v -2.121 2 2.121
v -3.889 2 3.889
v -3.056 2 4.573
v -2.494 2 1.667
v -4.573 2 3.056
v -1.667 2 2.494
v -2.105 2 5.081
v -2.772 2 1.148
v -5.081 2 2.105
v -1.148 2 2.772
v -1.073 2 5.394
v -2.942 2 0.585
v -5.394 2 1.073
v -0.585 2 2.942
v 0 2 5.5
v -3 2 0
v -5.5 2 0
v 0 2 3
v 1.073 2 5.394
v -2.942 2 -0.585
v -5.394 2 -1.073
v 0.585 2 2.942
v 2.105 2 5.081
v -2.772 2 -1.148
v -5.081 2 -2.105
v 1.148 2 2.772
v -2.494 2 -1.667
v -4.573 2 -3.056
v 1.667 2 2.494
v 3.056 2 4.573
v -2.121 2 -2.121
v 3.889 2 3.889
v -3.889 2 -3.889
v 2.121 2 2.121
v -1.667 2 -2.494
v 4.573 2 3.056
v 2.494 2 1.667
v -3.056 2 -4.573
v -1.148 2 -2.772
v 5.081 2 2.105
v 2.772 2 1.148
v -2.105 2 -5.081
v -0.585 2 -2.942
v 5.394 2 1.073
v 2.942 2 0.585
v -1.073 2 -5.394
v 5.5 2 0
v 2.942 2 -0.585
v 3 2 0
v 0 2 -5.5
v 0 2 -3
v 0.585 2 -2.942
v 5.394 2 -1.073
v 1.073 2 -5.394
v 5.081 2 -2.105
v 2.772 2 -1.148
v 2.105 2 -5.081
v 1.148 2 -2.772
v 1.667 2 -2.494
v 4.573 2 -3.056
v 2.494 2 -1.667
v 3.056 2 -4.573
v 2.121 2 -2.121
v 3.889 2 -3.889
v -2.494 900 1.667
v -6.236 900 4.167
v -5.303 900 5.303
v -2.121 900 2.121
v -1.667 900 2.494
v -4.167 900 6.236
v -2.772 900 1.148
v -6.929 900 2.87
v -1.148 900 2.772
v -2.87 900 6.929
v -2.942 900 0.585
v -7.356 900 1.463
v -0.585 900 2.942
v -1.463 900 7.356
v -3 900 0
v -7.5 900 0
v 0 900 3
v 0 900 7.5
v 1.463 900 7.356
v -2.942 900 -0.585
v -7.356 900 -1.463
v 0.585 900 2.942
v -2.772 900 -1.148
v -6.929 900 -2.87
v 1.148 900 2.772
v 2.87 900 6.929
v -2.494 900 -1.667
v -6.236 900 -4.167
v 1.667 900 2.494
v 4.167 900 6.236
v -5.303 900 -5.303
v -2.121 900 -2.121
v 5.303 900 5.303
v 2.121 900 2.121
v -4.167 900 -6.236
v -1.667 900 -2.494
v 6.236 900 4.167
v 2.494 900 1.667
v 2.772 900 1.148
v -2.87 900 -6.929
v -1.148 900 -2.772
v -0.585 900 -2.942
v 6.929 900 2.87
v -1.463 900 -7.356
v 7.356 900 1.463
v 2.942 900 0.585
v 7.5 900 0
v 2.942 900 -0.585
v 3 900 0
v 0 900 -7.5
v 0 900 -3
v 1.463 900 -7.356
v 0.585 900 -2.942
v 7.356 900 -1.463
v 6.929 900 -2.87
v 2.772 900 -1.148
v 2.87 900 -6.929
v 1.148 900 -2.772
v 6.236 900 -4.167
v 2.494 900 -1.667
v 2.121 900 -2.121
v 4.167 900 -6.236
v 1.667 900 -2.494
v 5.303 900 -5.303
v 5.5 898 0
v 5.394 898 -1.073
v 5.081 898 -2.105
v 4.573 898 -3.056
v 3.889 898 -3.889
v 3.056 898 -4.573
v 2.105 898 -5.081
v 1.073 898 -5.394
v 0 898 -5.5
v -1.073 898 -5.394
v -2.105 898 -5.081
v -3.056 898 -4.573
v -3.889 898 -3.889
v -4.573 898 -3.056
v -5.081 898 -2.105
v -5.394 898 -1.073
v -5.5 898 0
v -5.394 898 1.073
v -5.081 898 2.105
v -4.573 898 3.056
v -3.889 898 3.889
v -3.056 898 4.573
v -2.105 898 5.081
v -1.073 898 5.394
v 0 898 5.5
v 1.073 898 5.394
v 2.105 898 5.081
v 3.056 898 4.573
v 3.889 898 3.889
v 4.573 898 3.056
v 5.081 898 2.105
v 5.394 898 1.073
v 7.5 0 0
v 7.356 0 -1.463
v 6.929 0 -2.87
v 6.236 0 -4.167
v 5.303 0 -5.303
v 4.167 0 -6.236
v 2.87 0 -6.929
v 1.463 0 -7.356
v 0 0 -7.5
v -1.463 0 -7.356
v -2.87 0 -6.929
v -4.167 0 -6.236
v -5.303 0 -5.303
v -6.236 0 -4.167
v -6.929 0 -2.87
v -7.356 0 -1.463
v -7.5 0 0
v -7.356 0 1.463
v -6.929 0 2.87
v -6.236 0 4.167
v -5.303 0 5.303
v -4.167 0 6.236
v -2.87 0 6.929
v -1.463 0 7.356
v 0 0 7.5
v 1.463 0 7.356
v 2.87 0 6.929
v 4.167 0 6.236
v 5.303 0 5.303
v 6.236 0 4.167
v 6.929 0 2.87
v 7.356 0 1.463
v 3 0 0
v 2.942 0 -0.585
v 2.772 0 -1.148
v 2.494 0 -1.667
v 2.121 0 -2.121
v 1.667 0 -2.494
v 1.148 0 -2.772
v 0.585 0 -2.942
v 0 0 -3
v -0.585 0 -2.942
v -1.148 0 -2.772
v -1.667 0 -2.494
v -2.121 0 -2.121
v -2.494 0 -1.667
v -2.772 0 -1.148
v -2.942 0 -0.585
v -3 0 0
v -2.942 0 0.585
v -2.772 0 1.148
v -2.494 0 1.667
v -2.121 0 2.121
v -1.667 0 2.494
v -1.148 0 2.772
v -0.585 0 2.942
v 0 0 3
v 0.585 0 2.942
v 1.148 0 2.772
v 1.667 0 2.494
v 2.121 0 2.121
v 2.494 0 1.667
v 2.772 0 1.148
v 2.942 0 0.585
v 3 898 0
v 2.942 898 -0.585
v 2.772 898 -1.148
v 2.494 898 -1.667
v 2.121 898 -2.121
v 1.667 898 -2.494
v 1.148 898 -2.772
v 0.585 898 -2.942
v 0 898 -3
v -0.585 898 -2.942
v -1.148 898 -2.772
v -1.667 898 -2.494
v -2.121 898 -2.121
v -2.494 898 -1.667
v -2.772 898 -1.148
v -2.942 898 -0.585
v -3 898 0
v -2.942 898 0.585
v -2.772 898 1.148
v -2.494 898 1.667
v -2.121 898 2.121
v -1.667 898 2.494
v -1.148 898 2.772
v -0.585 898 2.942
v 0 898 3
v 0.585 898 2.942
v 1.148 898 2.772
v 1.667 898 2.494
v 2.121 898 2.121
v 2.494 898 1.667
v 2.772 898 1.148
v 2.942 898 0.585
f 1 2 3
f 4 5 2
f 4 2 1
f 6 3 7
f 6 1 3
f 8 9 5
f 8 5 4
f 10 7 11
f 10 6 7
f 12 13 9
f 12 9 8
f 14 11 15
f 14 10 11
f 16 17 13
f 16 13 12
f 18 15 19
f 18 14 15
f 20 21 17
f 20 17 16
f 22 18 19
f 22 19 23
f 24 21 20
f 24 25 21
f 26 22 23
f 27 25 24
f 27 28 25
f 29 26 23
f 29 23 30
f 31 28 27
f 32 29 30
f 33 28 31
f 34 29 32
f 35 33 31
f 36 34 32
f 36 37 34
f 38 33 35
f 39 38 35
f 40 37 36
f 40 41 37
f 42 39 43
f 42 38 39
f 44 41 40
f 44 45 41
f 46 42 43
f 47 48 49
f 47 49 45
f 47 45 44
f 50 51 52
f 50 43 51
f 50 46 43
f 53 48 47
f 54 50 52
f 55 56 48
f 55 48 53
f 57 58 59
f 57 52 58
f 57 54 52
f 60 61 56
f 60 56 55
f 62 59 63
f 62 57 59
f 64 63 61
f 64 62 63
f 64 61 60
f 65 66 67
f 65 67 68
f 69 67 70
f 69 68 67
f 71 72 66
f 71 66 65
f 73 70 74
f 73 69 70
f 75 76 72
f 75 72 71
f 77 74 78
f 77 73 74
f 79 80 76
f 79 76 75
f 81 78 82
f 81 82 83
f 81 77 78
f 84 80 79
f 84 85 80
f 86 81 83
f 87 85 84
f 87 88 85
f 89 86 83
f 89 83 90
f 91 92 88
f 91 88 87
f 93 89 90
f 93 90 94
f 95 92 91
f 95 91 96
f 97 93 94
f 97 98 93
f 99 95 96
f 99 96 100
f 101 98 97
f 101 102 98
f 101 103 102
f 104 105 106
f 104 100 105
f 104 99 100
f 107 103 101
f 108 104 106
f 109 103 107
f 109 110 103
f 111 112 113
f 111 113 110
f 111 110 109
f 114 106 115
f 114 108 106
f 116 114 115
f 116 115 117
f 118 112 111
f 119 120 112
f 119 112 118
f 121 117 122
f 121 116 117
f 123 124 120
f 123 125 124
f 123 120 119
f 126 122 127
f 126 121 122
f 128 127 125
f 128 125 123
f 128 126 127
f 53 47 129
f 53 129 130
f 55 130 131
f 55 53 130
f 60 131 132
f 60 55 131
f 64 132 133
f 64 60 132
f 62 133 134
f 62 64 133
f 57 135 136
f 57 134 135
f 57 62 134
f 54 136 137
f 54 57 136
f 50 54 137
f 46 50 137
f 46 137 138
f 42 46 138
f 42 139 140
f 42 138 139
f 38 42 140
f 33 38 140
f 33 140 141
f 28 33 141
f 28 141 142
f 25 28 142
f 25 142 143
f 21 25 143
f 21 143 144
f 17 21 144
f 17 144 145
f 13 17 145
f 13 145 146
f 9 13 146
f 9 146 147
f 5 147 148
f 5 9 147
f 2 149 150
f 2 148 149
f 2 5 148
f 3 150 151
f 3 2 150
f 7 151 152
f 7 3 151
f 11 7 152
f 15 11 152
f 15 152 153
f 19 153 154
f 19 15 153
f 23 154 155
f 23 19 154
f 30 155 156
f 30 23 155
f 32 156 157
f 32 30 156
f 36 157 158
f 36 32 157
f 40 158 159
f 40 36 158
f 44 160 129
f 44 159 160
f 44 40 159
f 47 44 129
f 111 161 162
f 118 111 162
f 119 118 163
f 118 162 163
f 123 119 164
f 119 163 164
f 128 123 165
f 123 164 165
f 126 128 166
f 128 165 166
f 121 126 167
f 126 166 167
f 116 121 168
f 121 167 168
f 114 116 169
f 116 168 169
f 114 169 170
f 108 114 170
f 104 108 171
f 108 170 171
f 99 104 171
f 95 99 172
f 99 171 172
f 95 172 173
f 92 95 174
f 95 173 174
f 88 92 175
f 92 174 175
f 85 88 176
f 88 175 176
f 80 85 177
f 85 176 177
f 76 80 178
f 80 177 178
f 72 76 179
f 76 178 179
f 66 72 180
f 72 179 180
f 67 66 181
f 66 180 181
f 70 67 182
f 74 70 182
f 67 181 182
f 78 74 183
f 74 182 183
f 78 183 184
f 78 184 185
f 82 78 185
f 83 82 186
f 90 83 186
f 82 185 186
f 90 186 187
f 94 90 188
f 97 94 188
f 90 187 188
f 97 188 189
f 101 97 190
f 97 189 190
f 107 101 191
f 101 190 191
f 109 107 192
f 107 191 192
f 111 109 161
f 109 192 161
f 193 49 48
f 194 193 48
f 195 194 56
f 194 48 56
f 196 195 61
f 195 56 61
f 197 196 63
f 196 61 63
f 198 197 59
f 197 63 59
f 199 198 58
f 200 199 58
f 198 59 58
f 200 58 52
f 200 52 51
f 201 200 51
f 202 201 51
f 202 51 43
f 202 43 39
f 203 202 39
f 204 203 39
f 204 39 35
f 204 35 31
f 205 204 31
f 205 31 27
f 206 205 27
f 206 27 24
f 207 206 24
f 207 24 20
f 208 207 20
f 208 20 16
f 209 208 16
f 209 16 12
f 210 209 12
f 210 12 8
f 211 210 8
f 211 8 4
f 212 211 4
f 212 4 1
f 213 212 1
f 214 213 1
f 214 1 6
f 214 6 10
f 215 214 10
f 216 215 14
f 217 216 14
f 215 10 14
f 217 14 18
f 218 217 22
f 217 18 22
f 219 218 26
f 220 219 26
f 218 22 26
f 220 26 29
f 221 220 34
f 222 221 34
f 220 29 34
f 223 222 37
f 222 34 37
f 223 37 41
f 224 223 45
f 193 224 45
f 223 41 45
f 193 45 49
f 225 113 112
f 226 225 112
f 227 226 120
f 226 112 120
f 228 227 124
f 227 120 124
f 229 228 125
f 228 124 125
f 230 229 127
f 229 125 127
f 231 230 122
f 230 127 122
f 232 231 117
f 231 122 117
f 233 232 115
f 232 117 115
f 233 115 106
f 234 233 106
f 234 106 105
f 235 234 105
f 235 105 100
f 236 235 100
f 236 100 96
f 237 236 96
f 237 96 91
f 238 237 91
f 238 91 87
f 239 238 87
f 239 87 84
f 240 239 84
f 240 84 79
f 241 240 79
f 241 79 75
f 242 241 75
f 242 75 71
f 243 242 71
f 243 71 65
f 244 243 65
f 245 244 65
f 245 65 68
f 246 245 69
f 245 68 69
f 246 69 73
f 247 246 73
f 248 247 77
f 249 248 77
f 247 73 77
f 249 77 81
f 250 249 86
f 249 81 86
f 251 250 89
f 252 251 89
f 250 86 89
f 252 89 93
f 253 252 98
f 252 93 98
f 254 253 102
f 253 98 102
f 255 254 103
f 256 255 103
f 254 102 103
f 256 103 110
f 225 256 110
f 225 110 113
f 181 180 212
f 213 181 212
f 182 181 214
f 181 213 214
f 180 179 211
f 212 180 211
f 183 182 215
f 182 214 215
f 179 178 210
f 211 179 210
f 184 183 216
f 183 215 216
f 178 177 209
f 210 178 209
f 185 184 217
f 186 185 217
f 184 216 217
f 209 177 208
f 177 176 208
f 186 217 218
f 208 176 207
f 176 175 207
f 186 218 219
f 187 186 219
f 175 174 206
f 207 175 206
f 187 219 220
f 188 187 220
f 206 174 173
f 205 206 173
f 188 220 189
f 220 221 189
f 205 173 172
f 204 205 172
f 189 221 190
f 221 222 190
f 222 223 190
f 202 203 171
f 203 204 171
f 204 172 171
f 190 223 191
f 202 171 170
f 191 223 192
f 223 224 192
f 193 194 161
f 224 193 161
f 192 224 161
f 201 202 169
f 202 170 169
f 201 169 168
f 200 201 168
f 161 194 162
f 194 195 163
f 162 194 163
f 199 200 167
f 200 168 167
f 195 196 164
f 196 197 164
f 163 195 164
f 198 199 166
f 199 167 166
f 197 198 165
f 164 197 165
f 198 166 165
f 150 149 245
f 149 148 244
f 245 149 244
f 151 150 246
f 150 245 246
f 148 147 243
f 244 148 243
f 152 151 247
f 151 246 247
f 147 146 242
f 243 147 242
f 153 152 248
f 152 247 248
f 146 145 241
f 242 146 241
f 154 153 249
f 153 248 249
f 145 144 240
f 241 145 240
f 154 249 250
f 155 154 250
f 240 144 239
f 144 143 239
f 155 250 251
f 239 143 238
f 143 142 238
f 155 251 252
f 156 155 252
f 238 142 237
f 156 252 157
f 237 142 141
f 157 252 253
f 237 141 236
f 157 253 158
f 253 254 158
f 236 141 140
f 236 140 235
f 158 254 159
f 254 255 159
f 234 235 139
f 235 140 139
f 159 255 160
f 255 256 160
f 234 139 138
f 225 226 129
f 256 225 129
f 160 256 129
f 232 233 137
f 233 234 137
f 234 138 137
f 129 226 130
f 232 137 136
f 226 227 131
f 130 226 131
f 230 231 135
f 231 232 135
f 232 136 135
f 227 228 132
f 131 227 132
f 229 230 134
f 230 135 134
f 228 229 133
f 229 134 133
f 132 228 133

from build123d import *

# Parameters (mm, degrees)
SKETCH3_R               = 7.5
BOSS_EXTRUDE1_DEPTH     = 900
SHELL2_T                = 2
SKETCH4_R               = 3
CUT_EXTRUDE1_DEPTH      = 1
CUT_EXTRUDE1_DEPTH_BACK = 901


with BuildPart() as part:
    # Sketch3 → Boss-Extrude1 (new body)
    with BuildSketch(Plane(origin=(0, 0, 0), x_dir=(1, 0, 0), z_dir=(0, 1, 0))):
        Circle(SKETCH3_R)
    extrude(amount=BOSS_EXTRUDE1_DEPTH)

    # Shell2 (no face opened: a closed hollow body)
    add(offset(amount=-SHELL2_T, mode=Mode.PRIVATE), mode=Mode.SUBTRACT)

    # Sketch4 → Cut-Extrude1 (cut, two sides)
    with BuildSketch(Plane(origin=(0, 900, 0), x_dir=(1, 0, 0), z_dir=(0, 1, 0))) as cut_extrude1_sk:
        Circle(SKETCH4_R)
    extrude(amount=CUT_EXTRUDE1_DEPTH, mode=Mode.SUBTRACT)
    extrude(cut_extrude1_sk.sketch, amount=-CUT_EXTRUDE1_DEPTH_BACK, mode=Mode.SUBTRACT)


solid = part.part
